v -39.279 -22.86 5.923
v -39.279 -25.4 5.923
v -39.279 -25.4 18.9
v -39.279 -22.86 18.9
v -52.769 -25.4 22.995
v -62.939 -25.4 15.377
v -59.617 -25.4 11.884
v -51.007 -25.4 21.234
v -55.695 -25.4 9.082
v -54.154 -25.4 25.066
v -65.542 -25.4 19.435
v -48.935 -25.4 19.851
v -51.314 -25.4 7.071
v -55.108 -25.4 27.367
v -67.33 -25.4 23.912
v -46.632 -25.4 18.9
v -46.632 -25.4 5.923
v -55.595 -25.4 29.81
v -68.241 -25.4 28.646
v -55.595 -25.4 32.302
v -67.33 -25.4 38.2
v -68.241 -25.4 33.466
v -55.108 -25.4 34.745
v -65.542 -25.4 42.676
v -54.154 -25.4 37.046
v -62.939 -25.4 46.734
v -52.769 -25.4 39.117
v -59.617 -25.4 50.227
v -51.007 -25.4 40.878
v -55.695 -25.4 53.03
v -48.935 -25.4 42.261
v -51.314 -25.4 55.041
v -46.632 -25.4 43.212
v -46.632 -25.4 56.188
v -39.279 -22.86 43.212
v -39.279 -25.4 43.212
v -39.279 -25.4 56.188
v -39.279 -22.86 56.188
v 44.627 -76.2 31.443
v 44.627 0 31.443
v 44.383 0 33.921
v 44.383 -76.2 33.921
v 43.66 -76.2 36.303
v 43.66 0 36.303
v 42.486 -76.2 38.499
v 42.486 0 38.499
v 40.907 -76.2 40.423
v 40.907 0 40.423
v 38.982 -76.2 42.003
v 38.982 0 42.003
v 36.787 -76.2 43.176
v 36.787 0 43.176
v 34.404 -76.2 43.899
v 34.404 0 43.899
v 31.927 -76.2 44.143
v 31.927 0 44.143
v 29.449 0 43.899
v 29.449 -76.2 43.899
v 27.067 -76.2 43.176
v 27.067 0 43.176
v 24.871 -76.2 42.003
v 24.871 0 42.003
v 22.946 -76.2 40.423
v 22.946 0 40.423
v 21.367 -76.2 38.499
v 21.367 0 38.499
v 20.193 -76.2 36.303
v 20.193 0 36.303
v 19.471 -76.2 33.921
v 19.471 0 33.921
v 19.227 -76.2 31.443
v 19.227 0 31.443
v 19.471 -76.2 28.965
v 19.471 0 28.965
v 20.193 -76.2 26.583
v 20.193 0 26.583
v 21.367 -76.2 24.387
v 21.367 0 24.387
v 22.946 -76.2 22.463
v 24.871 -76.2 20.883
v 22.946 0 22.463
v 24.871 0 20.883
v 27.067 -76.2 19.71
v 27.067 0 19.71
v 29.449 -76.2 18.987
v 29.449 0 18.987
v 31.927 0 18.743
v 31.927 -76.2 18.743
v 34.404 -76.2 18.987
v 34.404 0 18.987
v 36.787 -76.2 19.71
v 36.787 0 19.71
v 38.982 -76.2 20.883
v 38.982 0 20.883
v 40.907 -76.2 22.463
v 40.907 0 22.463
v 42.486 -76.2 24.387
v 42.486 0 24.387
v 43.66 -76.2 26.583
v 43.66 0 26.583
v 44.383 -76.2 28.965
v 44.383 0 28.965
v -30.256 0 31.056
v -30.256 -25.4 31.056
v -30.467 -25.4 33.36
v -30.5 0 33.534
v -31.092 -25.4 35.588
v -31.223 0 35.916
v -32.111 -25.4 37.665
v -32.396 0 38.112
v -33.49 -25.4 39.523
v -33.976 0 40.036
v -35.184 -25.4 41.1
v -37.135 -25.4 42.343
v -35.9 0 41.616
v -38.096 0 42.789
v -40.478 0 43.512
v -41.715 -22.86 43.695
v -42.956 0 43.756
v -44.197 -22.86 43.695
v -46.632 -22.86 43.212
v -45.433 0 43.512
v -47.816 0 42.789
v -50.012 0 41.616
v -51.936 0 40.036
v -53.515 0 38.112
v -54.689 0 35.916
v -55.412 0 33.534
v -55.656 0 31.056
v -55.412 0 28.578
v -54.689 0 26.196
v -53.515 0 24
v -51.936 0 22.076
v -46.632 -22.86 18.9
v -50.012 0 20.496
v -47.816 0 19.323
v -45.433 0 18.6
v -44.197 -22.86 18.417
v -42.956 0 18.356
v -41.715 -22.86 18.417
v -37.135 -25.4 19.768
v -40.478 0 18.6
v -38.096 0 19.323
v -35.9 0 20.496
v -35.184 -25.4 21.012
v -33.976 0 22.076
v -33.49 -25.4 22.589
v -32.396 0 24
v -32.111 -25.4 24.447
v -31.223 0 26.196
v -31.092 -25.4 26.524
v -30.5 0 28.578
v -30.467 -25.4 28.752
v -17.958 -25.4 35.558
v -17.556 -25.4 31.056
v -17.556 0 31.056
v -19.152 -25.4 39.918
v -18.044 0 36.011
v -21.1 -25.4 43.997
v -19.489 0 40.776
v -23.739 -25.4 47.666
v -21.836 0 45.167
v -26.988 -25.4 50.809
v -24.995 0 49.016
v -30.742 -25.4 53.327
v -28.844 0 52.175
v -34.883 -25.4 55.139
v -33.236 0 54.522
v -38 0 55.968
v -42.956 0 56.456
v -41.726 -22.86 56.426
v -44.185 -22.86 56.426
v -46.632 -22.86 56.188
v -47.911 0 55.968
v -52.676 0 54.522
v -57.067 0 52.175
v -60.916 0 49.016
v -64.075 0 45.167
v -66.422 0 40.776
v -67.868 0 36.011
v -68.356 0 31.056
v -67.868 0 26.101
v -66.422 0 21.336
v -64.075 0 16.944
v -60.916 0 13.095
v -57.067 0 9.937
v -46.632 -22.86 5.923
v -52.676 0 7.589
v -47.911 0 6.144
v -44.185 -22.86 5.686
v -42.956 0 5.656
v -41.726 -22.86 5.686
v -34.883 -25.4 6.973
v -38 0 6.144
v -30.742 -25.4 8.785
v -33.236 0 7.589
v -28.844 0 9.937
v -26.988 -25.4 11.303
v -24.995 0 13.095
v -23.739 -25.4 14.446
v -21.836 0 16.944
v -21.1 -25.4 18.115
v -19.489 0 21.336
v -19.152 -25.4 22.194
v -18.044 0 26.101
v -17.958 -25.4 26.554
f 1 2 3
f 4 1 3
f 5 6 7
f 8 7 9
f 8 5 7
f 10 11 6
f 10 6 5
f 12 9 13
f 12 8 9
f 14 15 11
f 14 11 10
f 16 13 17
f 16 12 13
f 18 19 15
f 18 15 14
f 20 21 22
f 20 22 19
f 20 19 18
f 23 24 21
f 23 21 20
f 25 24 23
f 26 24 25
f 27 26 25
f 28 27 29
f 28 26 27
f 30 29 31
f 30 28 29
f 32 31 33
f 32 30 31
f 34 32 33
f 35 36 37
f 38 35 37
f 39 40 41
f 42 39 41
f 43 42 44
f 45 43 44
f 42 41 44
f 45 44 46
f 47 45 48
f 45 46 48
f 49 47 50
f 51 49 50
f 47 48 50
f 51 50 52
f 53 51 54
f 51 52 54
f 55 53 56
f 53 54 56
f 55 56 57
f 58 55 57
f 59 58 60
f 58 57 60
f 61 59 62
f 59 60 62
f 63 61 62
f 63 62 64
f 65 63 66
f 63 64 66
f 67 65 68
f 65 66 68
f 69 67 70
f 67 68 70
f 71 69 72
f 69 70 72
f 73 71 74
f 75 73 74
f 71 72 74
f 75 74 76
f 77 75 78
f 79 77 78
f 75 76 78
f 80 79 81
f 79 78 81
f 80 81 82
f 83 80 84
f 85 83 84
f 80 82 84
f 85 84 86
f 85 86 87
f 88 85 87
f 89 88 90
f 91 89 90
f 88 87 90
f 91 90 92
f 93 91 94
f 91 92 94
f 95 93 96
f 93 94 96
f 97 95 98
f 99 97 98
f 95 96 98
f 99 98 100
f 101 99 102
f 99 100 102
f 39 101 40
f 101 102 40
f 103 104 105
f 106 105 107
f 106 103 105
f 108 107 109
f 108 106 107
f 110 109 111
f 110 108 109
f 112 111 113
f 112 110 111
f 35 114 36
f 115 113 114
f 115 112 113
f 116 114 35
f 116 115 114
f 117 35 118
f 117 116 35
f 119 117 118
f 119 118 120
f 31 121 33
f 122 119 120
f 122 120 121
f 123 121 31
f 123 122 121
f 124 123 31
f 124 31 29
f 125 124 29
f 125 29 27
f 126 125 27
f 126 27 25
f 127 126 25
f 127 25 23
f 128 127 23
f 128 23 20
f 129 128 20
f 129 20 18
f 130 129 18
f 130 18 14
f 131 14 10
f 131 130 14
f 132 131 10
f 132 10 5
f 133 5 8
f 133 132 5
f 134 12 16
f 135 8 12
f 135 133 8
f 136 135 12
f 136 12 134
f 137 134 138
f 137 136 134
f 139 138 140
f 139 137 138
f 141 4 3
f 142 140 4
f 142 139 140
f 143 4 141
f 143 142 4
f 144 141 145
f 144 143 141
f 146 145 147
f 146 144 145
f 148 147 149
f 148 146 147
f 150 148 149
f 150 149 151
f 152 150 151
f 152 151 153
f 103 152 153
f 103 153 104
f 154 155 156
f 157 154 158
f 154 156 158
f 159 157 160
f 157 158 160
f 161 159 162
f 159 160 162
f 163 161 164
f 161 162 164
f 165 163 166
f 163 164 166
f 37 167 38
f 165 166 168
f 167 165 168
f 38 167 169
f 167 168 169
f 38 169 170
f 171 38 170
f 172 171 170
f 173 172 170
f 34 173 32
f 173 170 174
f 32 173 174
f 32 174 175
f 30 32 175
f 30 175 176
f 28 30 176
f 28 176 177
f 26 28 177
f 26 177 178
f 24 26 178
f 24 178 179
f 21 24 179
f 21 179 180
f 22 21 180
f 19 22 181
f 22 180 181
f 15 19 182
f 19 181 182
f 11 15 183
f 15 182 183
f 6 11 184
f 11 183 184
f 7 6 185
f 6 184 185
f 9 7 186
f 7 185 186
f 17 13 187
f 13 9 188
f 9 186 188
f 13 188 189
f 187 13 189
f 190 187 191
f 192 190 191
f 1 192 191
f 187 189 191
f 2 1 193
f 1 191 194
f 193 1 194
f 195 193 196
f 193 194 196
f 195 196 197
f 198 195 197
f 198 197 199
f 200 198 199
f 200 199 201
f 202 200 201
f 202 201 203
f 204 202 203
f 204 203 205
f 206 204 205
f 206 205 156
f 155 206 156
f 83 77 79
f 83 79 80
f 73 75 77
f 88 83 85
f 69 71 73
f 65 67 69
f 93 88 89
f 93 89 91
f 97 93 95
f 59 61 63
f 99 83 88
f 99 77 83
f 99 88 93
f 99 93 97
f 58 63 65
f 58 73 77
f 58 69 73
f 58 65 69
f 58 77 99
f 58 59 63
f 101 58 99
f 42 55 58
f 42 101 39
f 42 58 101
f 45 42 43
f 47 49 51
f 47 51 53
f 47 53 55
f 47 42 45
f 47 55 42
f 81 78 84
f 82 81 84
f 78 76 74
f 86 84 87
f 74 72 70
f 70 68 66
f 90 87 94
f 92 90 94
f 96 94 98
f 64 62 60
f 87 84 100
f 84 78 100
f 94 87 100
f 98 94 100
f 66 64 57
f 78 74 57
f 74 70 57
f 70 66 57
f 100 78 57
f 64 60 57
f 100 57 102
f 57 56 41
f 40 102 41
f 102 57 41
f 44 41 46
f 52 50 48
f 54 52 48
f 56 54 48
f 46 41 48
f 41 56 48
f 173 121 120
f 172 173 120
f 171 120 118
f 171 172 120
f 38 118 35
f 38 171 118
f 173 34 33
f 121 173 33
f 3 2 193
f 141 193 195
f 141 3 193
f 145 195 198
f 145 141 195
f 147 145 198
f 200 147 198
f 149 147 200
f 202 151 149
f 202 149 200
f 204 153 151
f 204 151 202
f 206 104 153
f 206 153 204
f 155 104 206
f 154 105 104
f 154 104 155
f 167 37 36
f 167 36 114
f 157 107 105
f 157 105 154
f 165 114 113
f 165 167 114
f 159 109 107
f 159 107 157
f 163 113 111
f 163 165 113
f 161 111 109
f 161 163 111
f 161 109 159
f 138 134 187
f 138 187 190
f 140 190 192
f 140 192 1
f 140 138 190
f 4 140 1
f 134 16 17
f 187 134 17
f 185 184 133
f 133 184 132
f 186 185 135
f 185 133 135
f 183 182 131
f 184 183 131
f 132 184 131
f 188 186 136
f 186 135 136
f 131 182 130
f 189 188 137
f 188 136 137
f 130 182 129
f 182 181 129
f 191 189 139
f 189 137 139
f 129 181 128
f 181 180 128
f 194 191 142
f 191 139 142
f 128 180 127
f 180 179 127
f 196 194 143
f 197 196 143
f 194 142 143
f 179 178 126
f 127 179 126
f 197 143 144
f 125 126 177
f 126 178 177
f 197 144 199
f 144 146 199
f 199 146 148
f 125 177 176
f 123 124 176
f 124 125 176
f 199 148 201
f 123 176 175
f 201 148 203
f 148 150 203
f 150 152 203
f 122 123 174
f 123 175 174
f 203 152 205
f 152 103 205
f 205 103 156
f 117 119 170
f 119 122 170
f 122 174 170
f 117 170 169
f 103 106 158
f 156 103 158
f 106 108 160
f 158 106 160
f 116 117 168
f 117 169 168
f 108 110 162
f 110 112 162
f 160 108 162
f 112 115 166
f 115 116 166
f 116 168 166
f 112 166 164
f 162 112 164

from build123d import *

# Parameters (mm, degrees)
F1_R     = 12.7
F2_DEPTH = 76.2
F0_R     = 25.4
F0_R_2   = 12.7
F3_DEPTH = 25.4
F5_DEPTH = 2.54


with BuildPart() as f2:
    # F1 (on Front) → F2 (new body)
    with BuildSketch(Plane.XZ):
        with Locations((31.9266021252, 31.4428657293)):
            Circle(F1_R)
    extrude(amount=F2_DEPTH)


with BuildPart() as f3:
    # F0 (on Front) → F3 (new body)
    with BuildSketch(Plane.XZ):
        with Locations((-42.9557934403, 31.0558769852)):
            Circle(F0_R)
        with Locations((-42.9557934403, 31.0558769852)):
            Circle(F0_R_2, mode=Mode.SUBTRACT)
    extrude(amount=F3_DEPTH)

    # F4 (on face) → F5 (cut)
    with BuildSketch(Plane.XZ.offset(25.4)):
        with BuildLine():
            ThreePointArc((-39.279397577, 56.1884079651), (-42.9557934403, 56.4558769852), (-46.6321893036, 56.1884079651))
            Line((-46.6321893036, 56.1884079651), (-46.6321893036, 43.2121146209))
            ThreePointArc((-46.6321893036, 43.2121146209), (-42.9557934403, 43.7558769852), (-39.279397577, 43.2121146209))
            Line((-39.279397577, 43.2121146209), (-39.279397577, 56.1884079651))
        make_face()
        with BuildLine():
            Line((-46.6321893036, 18.8996393495), (-46.6321893036, 5.9233460053))
            ThreePointArc((-46.6321893036, 5.9233460053), (-42.9557934403, 5.6558769852), (-39.279397577, 5.9233460053))
            Line((-39.279397577, 5.9233460053), (-39.279397577, 18.8996393495))
            ThreePointArc((-39.279397577, 18.8996393495), (-42.9557934403, 18.3558769852), (-46.6321893036, 18.8996393495))
        make_face()
    extrude(amount=-F5_DEPTH, mode=Mode.SUBTRACT)


solid = Compound([f2.part, f3.part])
